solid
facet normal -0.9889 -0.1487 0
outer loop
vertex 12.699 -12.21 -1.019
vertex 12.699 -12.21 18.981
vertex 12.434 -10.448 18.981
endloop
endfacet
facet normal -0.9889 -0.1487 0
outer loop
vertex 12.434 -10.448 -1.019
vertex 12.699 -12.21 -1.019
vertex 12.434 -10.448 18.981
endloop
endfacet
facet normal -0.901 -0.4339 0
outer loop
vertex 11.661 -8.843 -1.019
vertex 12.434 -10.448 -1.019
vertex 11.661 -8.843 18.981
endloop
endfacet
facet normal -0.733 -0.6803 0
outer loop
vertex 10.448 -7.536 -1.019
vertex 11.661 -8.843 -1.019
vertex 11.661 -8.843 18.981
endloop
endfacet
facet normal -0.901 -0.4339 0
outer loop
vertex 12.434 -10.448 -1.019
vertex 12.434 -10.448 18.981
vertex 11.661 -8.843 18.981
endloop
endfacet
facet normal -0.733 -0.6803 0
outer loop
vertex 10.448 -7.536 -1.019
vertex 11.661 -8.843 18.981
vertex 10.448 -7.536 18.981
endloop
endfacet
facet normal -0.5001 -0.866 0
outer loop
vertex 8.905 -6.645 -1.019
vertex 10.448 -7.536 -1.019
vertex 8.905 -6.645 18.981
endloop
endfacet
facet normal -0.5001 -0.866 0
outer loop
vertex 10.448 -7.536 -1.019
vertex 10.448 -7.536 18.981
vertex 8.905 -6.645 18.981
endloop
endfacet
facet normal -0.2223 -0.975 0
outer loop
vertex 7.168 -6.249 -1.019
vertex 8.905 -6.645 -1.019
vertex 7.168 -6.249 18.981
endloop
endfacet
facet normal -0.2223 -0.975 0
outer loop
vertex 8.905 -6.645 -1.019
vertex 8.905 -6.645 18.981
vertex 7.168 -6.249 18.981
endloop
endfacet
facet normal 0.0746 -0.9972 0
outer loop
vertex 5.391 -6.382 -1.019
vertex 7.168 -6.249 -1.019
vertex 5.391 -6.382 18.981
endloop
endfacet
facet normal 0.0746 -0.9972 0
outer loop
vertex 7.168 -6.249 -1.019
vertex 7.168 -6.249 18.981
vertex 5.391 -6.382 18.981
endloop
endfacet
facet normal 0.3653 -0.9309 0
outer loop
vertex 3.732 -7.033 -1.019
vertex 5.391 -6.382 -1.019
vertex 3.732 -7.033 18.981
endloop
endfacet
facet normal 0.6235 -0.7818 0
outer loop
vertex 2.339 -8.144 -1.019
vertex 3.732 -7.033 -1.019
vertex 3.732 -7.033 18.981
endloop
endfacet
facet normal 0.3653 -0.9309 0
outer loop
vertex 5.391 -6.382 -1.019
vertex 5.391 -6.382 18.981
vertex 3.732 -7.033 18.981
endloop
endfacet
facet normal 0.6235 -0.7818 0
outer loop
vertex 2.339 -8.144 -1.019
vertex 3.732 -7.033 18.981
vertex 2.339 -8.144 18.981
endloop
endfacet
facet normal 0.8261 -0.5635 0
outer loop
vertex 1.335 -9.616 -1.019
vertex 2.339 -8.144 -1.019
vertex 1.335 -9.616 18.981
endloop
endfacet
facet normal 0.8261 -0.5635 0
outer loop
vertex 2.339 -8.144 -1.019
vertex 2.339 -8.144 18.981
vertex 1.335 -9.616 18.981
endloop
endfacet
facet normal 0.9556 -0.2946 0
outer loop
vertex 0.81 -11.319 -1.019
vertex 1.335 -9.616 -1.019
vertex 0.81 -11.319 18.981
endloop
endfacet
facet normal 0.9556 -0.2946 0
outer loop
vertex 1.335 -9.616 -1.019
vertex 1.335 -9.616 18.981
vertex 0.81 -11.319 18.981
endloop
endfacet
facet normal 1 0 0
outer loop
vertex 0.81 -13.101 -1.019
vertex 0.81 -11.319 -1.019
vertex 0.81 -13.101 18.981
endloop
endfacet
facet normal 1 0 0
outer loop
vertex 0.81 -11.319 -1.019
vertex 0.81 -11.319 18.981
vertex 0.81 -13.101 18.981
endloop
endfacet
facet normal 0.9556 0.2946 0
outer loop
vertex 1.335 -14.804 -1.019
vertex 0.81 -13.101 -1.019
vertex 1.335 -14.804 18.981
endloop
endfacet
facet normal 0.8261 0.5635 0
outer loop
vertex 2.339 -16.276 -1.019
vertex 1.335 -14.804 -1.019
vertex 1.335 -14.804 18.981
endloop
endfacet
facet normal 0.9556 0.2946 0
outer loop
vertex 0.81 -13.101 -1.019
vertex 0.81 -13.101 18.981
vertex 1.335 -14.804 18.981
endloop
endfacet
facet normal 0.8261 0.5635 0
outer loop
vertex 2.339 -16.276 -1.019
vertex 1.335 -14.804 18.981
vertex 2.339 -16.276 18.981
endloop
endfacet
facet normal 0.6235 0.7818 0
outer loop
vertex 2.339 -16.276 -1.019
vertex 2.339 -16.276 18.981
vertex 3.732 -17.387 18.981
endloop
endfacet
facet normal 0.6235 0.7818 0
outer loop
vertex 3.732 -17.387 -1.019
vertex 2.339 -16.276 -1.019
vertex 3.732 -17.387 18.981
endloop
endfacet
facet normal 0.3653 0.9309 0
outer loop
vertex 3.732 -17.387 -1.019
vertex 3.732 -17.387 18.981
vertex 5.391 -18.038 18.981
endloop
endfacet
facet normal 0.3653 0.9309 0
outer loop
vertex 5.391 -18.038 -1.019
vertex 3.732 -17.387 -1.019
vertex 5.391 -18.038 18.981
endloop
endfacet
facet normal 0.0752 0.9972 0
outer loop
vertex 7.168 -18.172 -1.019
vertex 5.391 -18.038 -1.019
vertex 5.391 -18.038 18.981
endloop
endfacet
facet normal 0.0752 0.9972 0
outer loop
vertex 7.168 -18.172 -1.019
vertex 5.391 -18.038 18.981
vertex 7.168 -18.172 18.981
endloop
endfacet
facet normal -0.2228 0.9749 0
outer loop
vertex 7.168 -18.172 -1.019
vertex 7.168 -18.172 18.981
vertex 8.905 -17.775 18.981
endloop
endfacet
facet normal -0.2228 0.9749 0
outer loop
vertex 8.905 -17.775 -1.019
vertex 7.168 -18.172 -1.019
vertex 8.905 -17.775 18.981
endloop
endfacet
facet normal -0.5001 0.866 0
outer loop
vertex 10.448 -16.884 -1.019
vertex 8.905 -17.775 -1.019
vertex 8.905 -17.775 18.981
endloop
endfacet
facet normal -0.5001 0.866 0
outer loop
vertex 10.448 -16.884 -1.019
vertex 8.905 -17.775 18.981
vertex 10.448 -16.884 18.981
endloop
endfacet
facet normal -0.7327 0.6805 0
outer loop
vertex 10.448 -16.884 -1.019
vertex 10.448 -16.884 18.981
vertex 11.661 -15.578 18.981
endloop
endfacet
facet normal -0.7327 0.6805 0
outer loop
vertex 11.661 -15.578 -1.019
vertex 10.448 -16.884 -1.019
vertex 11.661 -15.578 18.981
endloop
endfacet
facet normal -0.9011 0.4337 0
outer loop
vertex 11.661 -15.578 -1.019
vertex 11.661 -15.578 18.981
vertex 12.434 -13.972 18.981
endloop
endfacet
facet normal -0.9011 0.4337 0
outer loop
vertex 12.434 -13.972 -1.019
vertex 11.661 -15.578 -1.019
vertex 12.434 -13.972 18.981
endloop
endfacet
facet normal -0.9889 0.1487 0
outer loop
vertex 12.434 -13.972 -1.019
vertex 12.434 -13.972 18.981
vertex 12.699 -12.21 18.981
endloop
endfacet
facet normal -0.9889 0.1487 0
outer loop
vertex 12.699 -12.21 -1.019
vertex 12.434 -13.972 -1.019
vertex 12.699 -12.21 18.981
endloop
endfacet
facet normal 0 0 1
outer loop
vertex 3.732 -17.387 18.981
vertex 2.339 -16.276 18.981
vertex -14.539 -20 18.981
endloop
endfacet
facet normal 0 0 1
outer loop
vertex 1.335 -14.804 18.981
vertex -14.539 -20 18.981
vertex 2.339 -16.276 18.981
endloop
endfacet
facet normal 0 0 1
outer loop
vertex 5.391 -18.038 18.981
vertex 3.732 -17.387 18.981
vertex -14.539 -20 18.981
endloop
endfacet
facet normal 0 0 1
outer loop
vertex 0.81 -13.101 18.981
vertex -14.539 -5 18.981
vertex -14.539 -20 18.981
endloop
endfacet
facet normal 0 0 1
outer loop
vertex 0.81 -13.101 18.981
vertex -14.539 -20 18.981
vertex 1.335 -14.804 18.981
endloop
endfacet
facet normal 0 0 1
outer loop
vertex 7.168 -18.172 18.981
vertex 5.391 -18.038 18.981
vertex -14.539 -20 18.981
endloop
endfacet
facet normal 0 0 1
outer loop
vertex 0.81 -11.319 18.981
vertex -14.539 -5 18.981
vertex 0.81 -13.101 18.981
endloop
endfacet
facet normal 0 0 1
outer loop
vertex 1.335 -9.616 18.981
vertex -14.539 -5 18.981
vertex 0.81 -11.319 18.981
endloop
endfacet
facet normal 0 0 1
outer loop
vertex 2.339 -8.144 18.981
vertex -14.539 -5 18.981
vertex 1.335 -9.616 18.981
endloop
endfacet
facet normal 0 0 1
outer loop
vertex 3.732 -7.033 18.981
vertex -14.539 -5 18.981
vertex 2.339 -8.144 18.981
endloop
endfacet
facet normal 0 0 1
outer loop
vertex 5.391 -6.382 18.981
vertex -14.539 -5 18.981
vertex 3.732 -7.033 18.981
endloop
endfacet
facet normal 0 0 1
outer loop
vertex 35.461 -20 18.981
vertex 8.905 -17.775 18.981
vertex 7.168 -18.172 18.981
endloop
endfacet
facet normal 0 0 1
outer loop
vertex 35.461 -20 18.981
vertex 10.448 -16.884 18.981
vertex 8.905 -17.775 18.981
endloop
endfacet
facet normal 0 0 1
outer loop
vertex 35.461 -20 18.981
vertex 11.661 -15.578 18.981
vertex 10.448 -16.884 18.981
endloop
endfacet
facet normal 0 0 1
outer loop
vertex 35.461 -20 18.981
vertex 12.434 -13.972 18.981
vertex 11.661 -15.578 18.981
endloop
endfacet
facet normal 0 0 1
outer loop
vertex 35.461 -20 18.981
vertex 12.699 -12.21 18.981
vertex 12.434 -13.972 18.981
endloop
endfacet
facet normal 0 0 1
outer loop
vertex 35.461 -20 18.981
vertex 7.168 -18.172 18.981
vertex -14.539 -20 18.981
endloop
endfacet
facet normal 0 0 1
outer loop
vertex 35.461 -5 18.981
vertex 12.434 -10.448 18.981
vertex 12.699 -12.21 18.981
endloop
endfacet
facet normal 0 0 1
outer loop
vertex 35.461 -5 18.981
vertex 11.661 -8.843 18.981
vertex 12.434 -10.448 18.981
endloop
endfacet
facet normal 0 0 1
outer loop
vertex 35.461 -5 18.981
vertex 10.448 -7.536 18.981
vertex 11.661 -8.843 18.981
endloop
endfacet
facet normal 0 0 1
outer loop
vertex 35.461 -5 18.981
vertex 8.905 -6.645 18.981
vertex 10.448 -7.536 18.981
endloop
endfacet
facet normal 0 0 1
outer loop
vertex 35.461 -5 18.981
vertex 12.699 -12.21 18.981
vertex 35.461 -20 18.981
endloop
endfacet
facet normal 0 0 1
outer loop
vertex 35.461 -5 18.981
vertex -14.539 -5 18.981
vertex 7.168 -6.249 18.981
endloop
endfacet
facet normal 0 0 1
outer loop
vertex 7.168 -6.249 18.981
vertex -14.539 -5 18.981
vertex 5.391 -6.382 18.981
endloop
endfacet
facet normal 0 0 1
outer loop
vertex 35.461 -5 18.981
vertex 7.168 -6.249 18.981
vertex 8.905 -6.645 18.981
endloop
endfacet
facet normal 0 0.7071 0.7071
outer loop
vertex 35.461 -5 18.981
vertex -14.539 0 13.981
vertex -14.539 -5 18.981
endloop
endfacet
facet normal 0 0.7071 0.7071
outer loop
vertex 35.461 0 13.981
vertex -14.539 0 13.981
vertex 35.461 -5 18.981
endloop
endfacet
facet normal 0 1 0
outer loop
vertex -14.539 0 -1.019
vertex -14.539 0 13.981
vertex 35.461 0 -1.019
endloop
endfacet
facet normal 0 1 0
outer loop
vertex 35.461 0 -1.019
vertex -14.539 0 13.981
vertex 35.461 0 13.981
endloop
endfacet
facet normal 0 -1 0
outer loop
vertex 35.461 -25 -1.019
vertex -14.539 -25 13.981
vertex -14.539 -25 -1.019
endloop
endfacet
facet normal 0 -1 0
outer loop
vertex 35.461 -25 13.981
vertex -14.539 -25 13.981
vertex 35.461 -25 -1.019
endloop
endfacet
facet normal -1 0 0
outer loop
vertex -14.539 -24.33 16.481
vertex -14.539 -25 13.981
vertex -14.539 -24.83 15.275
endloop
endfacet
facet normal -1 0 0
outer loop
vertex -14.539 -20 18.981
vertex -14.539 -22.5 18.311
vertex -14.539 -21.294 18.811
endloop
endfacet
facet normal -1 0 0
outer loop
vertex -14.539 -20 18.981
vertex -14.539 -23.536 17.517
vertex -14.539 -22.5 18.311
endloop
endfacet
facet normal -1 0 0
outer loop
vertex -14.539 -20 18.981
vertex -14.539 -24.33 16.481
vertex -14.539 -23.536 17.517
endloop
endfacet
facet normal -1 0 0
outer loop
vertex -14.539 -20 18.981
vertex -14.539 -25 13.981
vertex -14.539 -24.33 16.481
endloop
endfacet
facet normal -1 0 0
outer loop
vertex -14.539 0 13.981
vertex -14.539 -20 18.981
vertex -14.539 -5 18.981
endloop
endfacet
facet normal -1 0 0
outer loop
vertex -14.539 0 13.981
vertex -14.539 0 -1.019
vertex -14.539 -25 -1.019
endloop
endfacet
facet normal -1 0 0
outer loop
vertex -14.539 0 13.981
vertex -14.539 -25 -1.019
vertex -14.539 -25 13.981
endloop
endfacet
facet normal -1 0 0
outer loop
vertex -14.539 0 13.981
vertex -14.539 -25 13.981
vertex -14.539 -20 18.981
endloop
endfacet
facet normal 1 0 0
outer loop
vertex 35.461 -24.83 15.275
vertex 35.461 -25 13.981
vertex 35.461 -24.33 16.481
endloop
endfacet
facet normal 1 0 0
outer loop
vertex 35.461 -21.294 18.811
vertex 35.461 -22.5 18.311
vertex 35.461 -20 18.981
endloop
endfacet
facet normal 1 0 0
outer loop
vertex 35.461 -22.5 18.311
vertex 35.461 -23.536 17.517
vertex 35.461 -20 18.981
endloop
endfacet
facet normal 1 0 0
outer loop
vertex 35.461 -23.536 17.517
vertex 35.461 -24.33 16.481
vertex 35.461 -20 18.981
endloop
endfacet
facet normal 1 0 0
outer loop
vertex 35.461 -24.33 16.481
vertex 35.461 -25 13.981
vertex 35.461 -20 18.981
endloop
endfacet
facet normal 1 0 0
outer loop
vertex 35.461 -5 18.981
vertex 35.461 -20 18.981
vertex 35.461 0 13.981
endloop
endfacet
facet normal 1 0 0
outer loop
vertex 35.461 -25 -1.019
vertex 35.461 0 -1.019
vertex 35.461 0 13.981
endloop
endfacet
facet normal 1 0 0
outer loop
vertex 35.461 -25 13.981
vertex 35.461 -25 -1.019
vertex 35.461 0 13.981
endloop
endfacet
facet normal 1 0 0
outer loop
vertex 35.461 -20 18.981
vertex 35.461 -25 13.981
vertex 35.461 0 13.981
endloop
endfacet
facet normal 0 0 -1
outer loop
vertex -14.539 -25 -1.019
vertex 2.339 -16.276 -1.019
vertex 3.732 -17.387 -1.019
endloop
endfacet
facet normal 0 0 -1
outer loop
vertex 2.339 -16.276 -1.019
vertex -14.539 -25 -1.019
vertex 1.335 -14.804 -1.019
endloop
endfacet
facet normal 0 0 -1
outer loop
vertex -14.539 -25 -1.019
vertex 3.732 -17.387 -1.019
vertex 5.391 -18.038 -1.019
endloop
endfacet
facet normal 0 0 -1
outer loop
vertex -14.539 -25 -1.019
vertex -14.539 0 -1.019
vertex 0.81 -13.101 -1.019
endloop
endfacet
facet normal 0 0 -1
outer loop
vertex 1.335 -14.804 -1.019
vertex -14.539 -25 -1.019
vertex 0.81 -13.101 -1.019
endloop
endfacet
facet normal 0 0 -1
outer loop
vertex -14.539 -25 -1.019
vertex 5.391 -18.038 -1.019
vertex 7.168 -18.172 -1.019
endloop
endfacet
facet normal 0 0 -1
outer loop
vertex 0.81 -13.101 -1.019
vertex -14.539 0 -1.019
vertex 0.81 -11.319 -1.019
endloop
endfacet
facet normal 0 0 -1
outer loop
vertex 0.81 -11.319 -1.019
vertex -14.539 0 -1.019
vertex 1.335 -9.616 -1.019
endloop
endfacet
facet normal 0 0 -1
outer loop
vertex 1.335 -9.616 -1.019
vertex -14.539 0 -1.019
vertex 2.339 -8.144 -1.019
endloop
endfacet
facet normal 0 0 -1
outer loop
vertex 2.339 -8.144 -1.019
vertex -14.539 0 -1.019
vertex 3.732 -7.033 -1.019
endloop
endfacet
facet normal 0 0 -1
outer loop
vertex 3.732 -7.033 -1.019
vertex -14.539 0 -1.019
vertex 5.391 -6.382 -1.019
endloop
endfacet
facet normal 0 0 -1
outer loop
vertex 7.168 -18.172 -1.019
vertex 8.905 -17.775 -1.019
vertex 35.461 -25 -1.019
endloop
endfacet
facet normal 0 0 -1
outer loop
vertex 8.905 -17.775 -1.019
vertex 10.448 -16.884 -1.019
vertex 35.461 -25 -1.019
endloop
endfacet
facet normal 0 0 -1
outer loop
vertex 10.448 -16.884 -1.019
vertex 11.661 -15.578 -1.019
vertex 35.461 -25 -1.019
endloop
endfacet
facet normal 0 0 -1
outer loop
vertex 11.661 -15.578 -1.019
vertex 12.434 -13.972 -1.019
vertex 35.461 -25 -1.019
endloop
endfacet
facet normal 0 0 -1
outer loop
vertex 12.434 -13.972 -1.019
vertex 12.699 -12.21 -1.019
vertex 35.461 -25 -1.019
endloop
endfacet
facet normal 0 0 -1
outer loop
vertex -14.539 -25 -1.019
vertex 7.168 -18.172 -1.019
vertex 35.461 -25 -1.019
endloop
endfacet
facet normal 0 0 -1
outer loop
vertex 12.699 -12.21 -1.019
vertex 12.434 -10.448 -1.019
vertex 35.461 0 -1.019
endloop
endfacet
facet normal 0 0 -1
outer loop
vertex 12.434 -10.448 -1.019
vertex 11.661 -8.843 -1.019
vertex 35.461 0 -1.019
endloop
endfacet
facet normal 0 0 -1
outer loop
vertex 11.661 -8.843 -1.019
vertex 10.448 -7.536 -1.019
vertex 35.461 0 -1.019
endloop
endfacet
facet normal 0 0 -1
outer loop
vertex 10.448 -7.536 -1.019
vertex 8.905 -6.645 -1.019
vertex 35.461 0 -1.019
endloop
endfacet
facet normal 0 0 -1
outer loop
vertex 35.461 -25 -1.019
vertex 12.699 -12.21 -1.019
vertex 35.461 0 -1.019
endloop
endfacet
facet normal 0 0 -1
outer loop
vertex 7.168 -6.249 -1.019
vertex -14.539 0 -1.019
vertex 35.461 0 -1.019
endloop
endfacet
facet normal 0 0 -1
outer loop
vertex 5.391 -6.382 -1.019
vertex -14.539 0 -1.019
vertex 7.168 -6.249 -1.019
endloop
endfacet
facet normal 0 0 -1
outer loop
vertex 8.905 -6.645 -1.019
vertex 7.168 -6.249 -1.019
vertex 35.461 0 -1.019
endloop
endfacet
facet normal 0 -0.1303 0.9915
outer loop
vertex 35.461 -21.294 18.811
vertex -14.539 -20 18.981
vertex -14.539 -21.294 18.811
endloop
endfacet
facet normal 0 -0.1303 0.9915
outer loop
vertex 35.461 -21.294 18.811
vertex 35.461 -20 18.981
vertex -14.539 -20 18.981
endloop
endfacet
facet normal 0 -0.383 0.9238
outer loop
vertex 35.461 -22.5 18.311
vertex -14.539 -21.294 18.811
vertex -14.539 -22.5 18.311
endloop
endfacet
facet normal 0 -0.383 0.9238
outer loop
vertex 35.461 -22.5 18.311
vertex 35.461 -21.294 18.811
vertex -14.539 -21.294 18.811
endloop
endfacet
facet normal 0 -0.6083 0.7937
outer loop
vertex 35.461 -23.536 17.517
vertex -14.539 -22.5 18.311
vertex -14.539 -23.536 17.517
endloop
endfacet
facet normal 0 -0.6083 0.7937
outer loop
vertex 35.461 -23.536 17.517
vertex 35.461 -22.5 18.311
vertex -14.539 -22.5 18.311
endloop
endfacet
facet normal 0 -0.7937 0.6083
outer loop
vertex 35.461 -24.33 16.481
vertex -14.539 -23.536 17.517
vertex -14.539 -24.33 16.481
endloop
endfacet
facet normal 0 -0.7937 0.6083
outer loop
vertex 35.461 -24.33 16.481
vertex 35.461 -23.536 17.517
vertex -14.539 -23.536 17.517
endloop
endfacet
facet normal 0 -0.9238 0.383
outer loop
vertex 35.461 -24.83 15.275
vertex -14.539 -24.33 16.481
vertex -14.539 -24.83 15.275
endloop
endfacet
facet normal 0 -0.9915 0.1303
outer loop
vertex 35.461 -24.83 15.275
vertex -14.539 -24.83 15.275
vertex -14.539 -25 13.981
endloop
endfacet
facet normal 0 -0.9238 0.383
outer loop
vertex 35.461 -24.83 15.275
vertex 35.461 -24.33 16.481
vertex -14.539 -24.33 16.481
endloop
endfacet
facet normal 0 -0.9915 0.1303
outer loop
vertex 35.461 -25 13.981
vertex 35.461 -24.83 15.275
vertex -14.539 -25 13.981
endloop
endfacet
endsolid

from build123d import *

# Parameters (mm, degrees)
F0_W     = 50
F0_H     = 20
F1_DEPTH = 25
F2_R     = 5
F3_SIZE  = 5
F4_R     = 5.978128
F5_DEPTH = 25


with BuildPart() as f1:
    # F0 (on Front) → F1 (new body)
    with BuildSketch(Plane.XZ):
        with Locations((10.46083, 8.981205)):
            Rectangle(F0_W, F0_H)
    extrude(amount=F1_DEPTH)

    # F2
    f2_edges = [f1.edges().sort_by_distance(p)[0] for p in [
        (10.46083, -25, 18.981205),
    ]]
    fillet(f2_edges, radius=F2_R)

    # F3
    f3_edges = [f1.edges().sort_by_distance(p)[0] for p in [
        (10.46083, 0, 18.981205),
    ]]
    chamfer(f3_edges, length=F3_SIZE)

    # F4 (on face) → F5 (cut)
    with BuildSketch(Plane.XY.offset(18.981205)):
        with Locations((6.721196, -12.210171)):
            Circle(F4_R)
    extrude(amount=-F5_DEPTH, mode=Mode.SUBTRACT)


solid = f1.part
